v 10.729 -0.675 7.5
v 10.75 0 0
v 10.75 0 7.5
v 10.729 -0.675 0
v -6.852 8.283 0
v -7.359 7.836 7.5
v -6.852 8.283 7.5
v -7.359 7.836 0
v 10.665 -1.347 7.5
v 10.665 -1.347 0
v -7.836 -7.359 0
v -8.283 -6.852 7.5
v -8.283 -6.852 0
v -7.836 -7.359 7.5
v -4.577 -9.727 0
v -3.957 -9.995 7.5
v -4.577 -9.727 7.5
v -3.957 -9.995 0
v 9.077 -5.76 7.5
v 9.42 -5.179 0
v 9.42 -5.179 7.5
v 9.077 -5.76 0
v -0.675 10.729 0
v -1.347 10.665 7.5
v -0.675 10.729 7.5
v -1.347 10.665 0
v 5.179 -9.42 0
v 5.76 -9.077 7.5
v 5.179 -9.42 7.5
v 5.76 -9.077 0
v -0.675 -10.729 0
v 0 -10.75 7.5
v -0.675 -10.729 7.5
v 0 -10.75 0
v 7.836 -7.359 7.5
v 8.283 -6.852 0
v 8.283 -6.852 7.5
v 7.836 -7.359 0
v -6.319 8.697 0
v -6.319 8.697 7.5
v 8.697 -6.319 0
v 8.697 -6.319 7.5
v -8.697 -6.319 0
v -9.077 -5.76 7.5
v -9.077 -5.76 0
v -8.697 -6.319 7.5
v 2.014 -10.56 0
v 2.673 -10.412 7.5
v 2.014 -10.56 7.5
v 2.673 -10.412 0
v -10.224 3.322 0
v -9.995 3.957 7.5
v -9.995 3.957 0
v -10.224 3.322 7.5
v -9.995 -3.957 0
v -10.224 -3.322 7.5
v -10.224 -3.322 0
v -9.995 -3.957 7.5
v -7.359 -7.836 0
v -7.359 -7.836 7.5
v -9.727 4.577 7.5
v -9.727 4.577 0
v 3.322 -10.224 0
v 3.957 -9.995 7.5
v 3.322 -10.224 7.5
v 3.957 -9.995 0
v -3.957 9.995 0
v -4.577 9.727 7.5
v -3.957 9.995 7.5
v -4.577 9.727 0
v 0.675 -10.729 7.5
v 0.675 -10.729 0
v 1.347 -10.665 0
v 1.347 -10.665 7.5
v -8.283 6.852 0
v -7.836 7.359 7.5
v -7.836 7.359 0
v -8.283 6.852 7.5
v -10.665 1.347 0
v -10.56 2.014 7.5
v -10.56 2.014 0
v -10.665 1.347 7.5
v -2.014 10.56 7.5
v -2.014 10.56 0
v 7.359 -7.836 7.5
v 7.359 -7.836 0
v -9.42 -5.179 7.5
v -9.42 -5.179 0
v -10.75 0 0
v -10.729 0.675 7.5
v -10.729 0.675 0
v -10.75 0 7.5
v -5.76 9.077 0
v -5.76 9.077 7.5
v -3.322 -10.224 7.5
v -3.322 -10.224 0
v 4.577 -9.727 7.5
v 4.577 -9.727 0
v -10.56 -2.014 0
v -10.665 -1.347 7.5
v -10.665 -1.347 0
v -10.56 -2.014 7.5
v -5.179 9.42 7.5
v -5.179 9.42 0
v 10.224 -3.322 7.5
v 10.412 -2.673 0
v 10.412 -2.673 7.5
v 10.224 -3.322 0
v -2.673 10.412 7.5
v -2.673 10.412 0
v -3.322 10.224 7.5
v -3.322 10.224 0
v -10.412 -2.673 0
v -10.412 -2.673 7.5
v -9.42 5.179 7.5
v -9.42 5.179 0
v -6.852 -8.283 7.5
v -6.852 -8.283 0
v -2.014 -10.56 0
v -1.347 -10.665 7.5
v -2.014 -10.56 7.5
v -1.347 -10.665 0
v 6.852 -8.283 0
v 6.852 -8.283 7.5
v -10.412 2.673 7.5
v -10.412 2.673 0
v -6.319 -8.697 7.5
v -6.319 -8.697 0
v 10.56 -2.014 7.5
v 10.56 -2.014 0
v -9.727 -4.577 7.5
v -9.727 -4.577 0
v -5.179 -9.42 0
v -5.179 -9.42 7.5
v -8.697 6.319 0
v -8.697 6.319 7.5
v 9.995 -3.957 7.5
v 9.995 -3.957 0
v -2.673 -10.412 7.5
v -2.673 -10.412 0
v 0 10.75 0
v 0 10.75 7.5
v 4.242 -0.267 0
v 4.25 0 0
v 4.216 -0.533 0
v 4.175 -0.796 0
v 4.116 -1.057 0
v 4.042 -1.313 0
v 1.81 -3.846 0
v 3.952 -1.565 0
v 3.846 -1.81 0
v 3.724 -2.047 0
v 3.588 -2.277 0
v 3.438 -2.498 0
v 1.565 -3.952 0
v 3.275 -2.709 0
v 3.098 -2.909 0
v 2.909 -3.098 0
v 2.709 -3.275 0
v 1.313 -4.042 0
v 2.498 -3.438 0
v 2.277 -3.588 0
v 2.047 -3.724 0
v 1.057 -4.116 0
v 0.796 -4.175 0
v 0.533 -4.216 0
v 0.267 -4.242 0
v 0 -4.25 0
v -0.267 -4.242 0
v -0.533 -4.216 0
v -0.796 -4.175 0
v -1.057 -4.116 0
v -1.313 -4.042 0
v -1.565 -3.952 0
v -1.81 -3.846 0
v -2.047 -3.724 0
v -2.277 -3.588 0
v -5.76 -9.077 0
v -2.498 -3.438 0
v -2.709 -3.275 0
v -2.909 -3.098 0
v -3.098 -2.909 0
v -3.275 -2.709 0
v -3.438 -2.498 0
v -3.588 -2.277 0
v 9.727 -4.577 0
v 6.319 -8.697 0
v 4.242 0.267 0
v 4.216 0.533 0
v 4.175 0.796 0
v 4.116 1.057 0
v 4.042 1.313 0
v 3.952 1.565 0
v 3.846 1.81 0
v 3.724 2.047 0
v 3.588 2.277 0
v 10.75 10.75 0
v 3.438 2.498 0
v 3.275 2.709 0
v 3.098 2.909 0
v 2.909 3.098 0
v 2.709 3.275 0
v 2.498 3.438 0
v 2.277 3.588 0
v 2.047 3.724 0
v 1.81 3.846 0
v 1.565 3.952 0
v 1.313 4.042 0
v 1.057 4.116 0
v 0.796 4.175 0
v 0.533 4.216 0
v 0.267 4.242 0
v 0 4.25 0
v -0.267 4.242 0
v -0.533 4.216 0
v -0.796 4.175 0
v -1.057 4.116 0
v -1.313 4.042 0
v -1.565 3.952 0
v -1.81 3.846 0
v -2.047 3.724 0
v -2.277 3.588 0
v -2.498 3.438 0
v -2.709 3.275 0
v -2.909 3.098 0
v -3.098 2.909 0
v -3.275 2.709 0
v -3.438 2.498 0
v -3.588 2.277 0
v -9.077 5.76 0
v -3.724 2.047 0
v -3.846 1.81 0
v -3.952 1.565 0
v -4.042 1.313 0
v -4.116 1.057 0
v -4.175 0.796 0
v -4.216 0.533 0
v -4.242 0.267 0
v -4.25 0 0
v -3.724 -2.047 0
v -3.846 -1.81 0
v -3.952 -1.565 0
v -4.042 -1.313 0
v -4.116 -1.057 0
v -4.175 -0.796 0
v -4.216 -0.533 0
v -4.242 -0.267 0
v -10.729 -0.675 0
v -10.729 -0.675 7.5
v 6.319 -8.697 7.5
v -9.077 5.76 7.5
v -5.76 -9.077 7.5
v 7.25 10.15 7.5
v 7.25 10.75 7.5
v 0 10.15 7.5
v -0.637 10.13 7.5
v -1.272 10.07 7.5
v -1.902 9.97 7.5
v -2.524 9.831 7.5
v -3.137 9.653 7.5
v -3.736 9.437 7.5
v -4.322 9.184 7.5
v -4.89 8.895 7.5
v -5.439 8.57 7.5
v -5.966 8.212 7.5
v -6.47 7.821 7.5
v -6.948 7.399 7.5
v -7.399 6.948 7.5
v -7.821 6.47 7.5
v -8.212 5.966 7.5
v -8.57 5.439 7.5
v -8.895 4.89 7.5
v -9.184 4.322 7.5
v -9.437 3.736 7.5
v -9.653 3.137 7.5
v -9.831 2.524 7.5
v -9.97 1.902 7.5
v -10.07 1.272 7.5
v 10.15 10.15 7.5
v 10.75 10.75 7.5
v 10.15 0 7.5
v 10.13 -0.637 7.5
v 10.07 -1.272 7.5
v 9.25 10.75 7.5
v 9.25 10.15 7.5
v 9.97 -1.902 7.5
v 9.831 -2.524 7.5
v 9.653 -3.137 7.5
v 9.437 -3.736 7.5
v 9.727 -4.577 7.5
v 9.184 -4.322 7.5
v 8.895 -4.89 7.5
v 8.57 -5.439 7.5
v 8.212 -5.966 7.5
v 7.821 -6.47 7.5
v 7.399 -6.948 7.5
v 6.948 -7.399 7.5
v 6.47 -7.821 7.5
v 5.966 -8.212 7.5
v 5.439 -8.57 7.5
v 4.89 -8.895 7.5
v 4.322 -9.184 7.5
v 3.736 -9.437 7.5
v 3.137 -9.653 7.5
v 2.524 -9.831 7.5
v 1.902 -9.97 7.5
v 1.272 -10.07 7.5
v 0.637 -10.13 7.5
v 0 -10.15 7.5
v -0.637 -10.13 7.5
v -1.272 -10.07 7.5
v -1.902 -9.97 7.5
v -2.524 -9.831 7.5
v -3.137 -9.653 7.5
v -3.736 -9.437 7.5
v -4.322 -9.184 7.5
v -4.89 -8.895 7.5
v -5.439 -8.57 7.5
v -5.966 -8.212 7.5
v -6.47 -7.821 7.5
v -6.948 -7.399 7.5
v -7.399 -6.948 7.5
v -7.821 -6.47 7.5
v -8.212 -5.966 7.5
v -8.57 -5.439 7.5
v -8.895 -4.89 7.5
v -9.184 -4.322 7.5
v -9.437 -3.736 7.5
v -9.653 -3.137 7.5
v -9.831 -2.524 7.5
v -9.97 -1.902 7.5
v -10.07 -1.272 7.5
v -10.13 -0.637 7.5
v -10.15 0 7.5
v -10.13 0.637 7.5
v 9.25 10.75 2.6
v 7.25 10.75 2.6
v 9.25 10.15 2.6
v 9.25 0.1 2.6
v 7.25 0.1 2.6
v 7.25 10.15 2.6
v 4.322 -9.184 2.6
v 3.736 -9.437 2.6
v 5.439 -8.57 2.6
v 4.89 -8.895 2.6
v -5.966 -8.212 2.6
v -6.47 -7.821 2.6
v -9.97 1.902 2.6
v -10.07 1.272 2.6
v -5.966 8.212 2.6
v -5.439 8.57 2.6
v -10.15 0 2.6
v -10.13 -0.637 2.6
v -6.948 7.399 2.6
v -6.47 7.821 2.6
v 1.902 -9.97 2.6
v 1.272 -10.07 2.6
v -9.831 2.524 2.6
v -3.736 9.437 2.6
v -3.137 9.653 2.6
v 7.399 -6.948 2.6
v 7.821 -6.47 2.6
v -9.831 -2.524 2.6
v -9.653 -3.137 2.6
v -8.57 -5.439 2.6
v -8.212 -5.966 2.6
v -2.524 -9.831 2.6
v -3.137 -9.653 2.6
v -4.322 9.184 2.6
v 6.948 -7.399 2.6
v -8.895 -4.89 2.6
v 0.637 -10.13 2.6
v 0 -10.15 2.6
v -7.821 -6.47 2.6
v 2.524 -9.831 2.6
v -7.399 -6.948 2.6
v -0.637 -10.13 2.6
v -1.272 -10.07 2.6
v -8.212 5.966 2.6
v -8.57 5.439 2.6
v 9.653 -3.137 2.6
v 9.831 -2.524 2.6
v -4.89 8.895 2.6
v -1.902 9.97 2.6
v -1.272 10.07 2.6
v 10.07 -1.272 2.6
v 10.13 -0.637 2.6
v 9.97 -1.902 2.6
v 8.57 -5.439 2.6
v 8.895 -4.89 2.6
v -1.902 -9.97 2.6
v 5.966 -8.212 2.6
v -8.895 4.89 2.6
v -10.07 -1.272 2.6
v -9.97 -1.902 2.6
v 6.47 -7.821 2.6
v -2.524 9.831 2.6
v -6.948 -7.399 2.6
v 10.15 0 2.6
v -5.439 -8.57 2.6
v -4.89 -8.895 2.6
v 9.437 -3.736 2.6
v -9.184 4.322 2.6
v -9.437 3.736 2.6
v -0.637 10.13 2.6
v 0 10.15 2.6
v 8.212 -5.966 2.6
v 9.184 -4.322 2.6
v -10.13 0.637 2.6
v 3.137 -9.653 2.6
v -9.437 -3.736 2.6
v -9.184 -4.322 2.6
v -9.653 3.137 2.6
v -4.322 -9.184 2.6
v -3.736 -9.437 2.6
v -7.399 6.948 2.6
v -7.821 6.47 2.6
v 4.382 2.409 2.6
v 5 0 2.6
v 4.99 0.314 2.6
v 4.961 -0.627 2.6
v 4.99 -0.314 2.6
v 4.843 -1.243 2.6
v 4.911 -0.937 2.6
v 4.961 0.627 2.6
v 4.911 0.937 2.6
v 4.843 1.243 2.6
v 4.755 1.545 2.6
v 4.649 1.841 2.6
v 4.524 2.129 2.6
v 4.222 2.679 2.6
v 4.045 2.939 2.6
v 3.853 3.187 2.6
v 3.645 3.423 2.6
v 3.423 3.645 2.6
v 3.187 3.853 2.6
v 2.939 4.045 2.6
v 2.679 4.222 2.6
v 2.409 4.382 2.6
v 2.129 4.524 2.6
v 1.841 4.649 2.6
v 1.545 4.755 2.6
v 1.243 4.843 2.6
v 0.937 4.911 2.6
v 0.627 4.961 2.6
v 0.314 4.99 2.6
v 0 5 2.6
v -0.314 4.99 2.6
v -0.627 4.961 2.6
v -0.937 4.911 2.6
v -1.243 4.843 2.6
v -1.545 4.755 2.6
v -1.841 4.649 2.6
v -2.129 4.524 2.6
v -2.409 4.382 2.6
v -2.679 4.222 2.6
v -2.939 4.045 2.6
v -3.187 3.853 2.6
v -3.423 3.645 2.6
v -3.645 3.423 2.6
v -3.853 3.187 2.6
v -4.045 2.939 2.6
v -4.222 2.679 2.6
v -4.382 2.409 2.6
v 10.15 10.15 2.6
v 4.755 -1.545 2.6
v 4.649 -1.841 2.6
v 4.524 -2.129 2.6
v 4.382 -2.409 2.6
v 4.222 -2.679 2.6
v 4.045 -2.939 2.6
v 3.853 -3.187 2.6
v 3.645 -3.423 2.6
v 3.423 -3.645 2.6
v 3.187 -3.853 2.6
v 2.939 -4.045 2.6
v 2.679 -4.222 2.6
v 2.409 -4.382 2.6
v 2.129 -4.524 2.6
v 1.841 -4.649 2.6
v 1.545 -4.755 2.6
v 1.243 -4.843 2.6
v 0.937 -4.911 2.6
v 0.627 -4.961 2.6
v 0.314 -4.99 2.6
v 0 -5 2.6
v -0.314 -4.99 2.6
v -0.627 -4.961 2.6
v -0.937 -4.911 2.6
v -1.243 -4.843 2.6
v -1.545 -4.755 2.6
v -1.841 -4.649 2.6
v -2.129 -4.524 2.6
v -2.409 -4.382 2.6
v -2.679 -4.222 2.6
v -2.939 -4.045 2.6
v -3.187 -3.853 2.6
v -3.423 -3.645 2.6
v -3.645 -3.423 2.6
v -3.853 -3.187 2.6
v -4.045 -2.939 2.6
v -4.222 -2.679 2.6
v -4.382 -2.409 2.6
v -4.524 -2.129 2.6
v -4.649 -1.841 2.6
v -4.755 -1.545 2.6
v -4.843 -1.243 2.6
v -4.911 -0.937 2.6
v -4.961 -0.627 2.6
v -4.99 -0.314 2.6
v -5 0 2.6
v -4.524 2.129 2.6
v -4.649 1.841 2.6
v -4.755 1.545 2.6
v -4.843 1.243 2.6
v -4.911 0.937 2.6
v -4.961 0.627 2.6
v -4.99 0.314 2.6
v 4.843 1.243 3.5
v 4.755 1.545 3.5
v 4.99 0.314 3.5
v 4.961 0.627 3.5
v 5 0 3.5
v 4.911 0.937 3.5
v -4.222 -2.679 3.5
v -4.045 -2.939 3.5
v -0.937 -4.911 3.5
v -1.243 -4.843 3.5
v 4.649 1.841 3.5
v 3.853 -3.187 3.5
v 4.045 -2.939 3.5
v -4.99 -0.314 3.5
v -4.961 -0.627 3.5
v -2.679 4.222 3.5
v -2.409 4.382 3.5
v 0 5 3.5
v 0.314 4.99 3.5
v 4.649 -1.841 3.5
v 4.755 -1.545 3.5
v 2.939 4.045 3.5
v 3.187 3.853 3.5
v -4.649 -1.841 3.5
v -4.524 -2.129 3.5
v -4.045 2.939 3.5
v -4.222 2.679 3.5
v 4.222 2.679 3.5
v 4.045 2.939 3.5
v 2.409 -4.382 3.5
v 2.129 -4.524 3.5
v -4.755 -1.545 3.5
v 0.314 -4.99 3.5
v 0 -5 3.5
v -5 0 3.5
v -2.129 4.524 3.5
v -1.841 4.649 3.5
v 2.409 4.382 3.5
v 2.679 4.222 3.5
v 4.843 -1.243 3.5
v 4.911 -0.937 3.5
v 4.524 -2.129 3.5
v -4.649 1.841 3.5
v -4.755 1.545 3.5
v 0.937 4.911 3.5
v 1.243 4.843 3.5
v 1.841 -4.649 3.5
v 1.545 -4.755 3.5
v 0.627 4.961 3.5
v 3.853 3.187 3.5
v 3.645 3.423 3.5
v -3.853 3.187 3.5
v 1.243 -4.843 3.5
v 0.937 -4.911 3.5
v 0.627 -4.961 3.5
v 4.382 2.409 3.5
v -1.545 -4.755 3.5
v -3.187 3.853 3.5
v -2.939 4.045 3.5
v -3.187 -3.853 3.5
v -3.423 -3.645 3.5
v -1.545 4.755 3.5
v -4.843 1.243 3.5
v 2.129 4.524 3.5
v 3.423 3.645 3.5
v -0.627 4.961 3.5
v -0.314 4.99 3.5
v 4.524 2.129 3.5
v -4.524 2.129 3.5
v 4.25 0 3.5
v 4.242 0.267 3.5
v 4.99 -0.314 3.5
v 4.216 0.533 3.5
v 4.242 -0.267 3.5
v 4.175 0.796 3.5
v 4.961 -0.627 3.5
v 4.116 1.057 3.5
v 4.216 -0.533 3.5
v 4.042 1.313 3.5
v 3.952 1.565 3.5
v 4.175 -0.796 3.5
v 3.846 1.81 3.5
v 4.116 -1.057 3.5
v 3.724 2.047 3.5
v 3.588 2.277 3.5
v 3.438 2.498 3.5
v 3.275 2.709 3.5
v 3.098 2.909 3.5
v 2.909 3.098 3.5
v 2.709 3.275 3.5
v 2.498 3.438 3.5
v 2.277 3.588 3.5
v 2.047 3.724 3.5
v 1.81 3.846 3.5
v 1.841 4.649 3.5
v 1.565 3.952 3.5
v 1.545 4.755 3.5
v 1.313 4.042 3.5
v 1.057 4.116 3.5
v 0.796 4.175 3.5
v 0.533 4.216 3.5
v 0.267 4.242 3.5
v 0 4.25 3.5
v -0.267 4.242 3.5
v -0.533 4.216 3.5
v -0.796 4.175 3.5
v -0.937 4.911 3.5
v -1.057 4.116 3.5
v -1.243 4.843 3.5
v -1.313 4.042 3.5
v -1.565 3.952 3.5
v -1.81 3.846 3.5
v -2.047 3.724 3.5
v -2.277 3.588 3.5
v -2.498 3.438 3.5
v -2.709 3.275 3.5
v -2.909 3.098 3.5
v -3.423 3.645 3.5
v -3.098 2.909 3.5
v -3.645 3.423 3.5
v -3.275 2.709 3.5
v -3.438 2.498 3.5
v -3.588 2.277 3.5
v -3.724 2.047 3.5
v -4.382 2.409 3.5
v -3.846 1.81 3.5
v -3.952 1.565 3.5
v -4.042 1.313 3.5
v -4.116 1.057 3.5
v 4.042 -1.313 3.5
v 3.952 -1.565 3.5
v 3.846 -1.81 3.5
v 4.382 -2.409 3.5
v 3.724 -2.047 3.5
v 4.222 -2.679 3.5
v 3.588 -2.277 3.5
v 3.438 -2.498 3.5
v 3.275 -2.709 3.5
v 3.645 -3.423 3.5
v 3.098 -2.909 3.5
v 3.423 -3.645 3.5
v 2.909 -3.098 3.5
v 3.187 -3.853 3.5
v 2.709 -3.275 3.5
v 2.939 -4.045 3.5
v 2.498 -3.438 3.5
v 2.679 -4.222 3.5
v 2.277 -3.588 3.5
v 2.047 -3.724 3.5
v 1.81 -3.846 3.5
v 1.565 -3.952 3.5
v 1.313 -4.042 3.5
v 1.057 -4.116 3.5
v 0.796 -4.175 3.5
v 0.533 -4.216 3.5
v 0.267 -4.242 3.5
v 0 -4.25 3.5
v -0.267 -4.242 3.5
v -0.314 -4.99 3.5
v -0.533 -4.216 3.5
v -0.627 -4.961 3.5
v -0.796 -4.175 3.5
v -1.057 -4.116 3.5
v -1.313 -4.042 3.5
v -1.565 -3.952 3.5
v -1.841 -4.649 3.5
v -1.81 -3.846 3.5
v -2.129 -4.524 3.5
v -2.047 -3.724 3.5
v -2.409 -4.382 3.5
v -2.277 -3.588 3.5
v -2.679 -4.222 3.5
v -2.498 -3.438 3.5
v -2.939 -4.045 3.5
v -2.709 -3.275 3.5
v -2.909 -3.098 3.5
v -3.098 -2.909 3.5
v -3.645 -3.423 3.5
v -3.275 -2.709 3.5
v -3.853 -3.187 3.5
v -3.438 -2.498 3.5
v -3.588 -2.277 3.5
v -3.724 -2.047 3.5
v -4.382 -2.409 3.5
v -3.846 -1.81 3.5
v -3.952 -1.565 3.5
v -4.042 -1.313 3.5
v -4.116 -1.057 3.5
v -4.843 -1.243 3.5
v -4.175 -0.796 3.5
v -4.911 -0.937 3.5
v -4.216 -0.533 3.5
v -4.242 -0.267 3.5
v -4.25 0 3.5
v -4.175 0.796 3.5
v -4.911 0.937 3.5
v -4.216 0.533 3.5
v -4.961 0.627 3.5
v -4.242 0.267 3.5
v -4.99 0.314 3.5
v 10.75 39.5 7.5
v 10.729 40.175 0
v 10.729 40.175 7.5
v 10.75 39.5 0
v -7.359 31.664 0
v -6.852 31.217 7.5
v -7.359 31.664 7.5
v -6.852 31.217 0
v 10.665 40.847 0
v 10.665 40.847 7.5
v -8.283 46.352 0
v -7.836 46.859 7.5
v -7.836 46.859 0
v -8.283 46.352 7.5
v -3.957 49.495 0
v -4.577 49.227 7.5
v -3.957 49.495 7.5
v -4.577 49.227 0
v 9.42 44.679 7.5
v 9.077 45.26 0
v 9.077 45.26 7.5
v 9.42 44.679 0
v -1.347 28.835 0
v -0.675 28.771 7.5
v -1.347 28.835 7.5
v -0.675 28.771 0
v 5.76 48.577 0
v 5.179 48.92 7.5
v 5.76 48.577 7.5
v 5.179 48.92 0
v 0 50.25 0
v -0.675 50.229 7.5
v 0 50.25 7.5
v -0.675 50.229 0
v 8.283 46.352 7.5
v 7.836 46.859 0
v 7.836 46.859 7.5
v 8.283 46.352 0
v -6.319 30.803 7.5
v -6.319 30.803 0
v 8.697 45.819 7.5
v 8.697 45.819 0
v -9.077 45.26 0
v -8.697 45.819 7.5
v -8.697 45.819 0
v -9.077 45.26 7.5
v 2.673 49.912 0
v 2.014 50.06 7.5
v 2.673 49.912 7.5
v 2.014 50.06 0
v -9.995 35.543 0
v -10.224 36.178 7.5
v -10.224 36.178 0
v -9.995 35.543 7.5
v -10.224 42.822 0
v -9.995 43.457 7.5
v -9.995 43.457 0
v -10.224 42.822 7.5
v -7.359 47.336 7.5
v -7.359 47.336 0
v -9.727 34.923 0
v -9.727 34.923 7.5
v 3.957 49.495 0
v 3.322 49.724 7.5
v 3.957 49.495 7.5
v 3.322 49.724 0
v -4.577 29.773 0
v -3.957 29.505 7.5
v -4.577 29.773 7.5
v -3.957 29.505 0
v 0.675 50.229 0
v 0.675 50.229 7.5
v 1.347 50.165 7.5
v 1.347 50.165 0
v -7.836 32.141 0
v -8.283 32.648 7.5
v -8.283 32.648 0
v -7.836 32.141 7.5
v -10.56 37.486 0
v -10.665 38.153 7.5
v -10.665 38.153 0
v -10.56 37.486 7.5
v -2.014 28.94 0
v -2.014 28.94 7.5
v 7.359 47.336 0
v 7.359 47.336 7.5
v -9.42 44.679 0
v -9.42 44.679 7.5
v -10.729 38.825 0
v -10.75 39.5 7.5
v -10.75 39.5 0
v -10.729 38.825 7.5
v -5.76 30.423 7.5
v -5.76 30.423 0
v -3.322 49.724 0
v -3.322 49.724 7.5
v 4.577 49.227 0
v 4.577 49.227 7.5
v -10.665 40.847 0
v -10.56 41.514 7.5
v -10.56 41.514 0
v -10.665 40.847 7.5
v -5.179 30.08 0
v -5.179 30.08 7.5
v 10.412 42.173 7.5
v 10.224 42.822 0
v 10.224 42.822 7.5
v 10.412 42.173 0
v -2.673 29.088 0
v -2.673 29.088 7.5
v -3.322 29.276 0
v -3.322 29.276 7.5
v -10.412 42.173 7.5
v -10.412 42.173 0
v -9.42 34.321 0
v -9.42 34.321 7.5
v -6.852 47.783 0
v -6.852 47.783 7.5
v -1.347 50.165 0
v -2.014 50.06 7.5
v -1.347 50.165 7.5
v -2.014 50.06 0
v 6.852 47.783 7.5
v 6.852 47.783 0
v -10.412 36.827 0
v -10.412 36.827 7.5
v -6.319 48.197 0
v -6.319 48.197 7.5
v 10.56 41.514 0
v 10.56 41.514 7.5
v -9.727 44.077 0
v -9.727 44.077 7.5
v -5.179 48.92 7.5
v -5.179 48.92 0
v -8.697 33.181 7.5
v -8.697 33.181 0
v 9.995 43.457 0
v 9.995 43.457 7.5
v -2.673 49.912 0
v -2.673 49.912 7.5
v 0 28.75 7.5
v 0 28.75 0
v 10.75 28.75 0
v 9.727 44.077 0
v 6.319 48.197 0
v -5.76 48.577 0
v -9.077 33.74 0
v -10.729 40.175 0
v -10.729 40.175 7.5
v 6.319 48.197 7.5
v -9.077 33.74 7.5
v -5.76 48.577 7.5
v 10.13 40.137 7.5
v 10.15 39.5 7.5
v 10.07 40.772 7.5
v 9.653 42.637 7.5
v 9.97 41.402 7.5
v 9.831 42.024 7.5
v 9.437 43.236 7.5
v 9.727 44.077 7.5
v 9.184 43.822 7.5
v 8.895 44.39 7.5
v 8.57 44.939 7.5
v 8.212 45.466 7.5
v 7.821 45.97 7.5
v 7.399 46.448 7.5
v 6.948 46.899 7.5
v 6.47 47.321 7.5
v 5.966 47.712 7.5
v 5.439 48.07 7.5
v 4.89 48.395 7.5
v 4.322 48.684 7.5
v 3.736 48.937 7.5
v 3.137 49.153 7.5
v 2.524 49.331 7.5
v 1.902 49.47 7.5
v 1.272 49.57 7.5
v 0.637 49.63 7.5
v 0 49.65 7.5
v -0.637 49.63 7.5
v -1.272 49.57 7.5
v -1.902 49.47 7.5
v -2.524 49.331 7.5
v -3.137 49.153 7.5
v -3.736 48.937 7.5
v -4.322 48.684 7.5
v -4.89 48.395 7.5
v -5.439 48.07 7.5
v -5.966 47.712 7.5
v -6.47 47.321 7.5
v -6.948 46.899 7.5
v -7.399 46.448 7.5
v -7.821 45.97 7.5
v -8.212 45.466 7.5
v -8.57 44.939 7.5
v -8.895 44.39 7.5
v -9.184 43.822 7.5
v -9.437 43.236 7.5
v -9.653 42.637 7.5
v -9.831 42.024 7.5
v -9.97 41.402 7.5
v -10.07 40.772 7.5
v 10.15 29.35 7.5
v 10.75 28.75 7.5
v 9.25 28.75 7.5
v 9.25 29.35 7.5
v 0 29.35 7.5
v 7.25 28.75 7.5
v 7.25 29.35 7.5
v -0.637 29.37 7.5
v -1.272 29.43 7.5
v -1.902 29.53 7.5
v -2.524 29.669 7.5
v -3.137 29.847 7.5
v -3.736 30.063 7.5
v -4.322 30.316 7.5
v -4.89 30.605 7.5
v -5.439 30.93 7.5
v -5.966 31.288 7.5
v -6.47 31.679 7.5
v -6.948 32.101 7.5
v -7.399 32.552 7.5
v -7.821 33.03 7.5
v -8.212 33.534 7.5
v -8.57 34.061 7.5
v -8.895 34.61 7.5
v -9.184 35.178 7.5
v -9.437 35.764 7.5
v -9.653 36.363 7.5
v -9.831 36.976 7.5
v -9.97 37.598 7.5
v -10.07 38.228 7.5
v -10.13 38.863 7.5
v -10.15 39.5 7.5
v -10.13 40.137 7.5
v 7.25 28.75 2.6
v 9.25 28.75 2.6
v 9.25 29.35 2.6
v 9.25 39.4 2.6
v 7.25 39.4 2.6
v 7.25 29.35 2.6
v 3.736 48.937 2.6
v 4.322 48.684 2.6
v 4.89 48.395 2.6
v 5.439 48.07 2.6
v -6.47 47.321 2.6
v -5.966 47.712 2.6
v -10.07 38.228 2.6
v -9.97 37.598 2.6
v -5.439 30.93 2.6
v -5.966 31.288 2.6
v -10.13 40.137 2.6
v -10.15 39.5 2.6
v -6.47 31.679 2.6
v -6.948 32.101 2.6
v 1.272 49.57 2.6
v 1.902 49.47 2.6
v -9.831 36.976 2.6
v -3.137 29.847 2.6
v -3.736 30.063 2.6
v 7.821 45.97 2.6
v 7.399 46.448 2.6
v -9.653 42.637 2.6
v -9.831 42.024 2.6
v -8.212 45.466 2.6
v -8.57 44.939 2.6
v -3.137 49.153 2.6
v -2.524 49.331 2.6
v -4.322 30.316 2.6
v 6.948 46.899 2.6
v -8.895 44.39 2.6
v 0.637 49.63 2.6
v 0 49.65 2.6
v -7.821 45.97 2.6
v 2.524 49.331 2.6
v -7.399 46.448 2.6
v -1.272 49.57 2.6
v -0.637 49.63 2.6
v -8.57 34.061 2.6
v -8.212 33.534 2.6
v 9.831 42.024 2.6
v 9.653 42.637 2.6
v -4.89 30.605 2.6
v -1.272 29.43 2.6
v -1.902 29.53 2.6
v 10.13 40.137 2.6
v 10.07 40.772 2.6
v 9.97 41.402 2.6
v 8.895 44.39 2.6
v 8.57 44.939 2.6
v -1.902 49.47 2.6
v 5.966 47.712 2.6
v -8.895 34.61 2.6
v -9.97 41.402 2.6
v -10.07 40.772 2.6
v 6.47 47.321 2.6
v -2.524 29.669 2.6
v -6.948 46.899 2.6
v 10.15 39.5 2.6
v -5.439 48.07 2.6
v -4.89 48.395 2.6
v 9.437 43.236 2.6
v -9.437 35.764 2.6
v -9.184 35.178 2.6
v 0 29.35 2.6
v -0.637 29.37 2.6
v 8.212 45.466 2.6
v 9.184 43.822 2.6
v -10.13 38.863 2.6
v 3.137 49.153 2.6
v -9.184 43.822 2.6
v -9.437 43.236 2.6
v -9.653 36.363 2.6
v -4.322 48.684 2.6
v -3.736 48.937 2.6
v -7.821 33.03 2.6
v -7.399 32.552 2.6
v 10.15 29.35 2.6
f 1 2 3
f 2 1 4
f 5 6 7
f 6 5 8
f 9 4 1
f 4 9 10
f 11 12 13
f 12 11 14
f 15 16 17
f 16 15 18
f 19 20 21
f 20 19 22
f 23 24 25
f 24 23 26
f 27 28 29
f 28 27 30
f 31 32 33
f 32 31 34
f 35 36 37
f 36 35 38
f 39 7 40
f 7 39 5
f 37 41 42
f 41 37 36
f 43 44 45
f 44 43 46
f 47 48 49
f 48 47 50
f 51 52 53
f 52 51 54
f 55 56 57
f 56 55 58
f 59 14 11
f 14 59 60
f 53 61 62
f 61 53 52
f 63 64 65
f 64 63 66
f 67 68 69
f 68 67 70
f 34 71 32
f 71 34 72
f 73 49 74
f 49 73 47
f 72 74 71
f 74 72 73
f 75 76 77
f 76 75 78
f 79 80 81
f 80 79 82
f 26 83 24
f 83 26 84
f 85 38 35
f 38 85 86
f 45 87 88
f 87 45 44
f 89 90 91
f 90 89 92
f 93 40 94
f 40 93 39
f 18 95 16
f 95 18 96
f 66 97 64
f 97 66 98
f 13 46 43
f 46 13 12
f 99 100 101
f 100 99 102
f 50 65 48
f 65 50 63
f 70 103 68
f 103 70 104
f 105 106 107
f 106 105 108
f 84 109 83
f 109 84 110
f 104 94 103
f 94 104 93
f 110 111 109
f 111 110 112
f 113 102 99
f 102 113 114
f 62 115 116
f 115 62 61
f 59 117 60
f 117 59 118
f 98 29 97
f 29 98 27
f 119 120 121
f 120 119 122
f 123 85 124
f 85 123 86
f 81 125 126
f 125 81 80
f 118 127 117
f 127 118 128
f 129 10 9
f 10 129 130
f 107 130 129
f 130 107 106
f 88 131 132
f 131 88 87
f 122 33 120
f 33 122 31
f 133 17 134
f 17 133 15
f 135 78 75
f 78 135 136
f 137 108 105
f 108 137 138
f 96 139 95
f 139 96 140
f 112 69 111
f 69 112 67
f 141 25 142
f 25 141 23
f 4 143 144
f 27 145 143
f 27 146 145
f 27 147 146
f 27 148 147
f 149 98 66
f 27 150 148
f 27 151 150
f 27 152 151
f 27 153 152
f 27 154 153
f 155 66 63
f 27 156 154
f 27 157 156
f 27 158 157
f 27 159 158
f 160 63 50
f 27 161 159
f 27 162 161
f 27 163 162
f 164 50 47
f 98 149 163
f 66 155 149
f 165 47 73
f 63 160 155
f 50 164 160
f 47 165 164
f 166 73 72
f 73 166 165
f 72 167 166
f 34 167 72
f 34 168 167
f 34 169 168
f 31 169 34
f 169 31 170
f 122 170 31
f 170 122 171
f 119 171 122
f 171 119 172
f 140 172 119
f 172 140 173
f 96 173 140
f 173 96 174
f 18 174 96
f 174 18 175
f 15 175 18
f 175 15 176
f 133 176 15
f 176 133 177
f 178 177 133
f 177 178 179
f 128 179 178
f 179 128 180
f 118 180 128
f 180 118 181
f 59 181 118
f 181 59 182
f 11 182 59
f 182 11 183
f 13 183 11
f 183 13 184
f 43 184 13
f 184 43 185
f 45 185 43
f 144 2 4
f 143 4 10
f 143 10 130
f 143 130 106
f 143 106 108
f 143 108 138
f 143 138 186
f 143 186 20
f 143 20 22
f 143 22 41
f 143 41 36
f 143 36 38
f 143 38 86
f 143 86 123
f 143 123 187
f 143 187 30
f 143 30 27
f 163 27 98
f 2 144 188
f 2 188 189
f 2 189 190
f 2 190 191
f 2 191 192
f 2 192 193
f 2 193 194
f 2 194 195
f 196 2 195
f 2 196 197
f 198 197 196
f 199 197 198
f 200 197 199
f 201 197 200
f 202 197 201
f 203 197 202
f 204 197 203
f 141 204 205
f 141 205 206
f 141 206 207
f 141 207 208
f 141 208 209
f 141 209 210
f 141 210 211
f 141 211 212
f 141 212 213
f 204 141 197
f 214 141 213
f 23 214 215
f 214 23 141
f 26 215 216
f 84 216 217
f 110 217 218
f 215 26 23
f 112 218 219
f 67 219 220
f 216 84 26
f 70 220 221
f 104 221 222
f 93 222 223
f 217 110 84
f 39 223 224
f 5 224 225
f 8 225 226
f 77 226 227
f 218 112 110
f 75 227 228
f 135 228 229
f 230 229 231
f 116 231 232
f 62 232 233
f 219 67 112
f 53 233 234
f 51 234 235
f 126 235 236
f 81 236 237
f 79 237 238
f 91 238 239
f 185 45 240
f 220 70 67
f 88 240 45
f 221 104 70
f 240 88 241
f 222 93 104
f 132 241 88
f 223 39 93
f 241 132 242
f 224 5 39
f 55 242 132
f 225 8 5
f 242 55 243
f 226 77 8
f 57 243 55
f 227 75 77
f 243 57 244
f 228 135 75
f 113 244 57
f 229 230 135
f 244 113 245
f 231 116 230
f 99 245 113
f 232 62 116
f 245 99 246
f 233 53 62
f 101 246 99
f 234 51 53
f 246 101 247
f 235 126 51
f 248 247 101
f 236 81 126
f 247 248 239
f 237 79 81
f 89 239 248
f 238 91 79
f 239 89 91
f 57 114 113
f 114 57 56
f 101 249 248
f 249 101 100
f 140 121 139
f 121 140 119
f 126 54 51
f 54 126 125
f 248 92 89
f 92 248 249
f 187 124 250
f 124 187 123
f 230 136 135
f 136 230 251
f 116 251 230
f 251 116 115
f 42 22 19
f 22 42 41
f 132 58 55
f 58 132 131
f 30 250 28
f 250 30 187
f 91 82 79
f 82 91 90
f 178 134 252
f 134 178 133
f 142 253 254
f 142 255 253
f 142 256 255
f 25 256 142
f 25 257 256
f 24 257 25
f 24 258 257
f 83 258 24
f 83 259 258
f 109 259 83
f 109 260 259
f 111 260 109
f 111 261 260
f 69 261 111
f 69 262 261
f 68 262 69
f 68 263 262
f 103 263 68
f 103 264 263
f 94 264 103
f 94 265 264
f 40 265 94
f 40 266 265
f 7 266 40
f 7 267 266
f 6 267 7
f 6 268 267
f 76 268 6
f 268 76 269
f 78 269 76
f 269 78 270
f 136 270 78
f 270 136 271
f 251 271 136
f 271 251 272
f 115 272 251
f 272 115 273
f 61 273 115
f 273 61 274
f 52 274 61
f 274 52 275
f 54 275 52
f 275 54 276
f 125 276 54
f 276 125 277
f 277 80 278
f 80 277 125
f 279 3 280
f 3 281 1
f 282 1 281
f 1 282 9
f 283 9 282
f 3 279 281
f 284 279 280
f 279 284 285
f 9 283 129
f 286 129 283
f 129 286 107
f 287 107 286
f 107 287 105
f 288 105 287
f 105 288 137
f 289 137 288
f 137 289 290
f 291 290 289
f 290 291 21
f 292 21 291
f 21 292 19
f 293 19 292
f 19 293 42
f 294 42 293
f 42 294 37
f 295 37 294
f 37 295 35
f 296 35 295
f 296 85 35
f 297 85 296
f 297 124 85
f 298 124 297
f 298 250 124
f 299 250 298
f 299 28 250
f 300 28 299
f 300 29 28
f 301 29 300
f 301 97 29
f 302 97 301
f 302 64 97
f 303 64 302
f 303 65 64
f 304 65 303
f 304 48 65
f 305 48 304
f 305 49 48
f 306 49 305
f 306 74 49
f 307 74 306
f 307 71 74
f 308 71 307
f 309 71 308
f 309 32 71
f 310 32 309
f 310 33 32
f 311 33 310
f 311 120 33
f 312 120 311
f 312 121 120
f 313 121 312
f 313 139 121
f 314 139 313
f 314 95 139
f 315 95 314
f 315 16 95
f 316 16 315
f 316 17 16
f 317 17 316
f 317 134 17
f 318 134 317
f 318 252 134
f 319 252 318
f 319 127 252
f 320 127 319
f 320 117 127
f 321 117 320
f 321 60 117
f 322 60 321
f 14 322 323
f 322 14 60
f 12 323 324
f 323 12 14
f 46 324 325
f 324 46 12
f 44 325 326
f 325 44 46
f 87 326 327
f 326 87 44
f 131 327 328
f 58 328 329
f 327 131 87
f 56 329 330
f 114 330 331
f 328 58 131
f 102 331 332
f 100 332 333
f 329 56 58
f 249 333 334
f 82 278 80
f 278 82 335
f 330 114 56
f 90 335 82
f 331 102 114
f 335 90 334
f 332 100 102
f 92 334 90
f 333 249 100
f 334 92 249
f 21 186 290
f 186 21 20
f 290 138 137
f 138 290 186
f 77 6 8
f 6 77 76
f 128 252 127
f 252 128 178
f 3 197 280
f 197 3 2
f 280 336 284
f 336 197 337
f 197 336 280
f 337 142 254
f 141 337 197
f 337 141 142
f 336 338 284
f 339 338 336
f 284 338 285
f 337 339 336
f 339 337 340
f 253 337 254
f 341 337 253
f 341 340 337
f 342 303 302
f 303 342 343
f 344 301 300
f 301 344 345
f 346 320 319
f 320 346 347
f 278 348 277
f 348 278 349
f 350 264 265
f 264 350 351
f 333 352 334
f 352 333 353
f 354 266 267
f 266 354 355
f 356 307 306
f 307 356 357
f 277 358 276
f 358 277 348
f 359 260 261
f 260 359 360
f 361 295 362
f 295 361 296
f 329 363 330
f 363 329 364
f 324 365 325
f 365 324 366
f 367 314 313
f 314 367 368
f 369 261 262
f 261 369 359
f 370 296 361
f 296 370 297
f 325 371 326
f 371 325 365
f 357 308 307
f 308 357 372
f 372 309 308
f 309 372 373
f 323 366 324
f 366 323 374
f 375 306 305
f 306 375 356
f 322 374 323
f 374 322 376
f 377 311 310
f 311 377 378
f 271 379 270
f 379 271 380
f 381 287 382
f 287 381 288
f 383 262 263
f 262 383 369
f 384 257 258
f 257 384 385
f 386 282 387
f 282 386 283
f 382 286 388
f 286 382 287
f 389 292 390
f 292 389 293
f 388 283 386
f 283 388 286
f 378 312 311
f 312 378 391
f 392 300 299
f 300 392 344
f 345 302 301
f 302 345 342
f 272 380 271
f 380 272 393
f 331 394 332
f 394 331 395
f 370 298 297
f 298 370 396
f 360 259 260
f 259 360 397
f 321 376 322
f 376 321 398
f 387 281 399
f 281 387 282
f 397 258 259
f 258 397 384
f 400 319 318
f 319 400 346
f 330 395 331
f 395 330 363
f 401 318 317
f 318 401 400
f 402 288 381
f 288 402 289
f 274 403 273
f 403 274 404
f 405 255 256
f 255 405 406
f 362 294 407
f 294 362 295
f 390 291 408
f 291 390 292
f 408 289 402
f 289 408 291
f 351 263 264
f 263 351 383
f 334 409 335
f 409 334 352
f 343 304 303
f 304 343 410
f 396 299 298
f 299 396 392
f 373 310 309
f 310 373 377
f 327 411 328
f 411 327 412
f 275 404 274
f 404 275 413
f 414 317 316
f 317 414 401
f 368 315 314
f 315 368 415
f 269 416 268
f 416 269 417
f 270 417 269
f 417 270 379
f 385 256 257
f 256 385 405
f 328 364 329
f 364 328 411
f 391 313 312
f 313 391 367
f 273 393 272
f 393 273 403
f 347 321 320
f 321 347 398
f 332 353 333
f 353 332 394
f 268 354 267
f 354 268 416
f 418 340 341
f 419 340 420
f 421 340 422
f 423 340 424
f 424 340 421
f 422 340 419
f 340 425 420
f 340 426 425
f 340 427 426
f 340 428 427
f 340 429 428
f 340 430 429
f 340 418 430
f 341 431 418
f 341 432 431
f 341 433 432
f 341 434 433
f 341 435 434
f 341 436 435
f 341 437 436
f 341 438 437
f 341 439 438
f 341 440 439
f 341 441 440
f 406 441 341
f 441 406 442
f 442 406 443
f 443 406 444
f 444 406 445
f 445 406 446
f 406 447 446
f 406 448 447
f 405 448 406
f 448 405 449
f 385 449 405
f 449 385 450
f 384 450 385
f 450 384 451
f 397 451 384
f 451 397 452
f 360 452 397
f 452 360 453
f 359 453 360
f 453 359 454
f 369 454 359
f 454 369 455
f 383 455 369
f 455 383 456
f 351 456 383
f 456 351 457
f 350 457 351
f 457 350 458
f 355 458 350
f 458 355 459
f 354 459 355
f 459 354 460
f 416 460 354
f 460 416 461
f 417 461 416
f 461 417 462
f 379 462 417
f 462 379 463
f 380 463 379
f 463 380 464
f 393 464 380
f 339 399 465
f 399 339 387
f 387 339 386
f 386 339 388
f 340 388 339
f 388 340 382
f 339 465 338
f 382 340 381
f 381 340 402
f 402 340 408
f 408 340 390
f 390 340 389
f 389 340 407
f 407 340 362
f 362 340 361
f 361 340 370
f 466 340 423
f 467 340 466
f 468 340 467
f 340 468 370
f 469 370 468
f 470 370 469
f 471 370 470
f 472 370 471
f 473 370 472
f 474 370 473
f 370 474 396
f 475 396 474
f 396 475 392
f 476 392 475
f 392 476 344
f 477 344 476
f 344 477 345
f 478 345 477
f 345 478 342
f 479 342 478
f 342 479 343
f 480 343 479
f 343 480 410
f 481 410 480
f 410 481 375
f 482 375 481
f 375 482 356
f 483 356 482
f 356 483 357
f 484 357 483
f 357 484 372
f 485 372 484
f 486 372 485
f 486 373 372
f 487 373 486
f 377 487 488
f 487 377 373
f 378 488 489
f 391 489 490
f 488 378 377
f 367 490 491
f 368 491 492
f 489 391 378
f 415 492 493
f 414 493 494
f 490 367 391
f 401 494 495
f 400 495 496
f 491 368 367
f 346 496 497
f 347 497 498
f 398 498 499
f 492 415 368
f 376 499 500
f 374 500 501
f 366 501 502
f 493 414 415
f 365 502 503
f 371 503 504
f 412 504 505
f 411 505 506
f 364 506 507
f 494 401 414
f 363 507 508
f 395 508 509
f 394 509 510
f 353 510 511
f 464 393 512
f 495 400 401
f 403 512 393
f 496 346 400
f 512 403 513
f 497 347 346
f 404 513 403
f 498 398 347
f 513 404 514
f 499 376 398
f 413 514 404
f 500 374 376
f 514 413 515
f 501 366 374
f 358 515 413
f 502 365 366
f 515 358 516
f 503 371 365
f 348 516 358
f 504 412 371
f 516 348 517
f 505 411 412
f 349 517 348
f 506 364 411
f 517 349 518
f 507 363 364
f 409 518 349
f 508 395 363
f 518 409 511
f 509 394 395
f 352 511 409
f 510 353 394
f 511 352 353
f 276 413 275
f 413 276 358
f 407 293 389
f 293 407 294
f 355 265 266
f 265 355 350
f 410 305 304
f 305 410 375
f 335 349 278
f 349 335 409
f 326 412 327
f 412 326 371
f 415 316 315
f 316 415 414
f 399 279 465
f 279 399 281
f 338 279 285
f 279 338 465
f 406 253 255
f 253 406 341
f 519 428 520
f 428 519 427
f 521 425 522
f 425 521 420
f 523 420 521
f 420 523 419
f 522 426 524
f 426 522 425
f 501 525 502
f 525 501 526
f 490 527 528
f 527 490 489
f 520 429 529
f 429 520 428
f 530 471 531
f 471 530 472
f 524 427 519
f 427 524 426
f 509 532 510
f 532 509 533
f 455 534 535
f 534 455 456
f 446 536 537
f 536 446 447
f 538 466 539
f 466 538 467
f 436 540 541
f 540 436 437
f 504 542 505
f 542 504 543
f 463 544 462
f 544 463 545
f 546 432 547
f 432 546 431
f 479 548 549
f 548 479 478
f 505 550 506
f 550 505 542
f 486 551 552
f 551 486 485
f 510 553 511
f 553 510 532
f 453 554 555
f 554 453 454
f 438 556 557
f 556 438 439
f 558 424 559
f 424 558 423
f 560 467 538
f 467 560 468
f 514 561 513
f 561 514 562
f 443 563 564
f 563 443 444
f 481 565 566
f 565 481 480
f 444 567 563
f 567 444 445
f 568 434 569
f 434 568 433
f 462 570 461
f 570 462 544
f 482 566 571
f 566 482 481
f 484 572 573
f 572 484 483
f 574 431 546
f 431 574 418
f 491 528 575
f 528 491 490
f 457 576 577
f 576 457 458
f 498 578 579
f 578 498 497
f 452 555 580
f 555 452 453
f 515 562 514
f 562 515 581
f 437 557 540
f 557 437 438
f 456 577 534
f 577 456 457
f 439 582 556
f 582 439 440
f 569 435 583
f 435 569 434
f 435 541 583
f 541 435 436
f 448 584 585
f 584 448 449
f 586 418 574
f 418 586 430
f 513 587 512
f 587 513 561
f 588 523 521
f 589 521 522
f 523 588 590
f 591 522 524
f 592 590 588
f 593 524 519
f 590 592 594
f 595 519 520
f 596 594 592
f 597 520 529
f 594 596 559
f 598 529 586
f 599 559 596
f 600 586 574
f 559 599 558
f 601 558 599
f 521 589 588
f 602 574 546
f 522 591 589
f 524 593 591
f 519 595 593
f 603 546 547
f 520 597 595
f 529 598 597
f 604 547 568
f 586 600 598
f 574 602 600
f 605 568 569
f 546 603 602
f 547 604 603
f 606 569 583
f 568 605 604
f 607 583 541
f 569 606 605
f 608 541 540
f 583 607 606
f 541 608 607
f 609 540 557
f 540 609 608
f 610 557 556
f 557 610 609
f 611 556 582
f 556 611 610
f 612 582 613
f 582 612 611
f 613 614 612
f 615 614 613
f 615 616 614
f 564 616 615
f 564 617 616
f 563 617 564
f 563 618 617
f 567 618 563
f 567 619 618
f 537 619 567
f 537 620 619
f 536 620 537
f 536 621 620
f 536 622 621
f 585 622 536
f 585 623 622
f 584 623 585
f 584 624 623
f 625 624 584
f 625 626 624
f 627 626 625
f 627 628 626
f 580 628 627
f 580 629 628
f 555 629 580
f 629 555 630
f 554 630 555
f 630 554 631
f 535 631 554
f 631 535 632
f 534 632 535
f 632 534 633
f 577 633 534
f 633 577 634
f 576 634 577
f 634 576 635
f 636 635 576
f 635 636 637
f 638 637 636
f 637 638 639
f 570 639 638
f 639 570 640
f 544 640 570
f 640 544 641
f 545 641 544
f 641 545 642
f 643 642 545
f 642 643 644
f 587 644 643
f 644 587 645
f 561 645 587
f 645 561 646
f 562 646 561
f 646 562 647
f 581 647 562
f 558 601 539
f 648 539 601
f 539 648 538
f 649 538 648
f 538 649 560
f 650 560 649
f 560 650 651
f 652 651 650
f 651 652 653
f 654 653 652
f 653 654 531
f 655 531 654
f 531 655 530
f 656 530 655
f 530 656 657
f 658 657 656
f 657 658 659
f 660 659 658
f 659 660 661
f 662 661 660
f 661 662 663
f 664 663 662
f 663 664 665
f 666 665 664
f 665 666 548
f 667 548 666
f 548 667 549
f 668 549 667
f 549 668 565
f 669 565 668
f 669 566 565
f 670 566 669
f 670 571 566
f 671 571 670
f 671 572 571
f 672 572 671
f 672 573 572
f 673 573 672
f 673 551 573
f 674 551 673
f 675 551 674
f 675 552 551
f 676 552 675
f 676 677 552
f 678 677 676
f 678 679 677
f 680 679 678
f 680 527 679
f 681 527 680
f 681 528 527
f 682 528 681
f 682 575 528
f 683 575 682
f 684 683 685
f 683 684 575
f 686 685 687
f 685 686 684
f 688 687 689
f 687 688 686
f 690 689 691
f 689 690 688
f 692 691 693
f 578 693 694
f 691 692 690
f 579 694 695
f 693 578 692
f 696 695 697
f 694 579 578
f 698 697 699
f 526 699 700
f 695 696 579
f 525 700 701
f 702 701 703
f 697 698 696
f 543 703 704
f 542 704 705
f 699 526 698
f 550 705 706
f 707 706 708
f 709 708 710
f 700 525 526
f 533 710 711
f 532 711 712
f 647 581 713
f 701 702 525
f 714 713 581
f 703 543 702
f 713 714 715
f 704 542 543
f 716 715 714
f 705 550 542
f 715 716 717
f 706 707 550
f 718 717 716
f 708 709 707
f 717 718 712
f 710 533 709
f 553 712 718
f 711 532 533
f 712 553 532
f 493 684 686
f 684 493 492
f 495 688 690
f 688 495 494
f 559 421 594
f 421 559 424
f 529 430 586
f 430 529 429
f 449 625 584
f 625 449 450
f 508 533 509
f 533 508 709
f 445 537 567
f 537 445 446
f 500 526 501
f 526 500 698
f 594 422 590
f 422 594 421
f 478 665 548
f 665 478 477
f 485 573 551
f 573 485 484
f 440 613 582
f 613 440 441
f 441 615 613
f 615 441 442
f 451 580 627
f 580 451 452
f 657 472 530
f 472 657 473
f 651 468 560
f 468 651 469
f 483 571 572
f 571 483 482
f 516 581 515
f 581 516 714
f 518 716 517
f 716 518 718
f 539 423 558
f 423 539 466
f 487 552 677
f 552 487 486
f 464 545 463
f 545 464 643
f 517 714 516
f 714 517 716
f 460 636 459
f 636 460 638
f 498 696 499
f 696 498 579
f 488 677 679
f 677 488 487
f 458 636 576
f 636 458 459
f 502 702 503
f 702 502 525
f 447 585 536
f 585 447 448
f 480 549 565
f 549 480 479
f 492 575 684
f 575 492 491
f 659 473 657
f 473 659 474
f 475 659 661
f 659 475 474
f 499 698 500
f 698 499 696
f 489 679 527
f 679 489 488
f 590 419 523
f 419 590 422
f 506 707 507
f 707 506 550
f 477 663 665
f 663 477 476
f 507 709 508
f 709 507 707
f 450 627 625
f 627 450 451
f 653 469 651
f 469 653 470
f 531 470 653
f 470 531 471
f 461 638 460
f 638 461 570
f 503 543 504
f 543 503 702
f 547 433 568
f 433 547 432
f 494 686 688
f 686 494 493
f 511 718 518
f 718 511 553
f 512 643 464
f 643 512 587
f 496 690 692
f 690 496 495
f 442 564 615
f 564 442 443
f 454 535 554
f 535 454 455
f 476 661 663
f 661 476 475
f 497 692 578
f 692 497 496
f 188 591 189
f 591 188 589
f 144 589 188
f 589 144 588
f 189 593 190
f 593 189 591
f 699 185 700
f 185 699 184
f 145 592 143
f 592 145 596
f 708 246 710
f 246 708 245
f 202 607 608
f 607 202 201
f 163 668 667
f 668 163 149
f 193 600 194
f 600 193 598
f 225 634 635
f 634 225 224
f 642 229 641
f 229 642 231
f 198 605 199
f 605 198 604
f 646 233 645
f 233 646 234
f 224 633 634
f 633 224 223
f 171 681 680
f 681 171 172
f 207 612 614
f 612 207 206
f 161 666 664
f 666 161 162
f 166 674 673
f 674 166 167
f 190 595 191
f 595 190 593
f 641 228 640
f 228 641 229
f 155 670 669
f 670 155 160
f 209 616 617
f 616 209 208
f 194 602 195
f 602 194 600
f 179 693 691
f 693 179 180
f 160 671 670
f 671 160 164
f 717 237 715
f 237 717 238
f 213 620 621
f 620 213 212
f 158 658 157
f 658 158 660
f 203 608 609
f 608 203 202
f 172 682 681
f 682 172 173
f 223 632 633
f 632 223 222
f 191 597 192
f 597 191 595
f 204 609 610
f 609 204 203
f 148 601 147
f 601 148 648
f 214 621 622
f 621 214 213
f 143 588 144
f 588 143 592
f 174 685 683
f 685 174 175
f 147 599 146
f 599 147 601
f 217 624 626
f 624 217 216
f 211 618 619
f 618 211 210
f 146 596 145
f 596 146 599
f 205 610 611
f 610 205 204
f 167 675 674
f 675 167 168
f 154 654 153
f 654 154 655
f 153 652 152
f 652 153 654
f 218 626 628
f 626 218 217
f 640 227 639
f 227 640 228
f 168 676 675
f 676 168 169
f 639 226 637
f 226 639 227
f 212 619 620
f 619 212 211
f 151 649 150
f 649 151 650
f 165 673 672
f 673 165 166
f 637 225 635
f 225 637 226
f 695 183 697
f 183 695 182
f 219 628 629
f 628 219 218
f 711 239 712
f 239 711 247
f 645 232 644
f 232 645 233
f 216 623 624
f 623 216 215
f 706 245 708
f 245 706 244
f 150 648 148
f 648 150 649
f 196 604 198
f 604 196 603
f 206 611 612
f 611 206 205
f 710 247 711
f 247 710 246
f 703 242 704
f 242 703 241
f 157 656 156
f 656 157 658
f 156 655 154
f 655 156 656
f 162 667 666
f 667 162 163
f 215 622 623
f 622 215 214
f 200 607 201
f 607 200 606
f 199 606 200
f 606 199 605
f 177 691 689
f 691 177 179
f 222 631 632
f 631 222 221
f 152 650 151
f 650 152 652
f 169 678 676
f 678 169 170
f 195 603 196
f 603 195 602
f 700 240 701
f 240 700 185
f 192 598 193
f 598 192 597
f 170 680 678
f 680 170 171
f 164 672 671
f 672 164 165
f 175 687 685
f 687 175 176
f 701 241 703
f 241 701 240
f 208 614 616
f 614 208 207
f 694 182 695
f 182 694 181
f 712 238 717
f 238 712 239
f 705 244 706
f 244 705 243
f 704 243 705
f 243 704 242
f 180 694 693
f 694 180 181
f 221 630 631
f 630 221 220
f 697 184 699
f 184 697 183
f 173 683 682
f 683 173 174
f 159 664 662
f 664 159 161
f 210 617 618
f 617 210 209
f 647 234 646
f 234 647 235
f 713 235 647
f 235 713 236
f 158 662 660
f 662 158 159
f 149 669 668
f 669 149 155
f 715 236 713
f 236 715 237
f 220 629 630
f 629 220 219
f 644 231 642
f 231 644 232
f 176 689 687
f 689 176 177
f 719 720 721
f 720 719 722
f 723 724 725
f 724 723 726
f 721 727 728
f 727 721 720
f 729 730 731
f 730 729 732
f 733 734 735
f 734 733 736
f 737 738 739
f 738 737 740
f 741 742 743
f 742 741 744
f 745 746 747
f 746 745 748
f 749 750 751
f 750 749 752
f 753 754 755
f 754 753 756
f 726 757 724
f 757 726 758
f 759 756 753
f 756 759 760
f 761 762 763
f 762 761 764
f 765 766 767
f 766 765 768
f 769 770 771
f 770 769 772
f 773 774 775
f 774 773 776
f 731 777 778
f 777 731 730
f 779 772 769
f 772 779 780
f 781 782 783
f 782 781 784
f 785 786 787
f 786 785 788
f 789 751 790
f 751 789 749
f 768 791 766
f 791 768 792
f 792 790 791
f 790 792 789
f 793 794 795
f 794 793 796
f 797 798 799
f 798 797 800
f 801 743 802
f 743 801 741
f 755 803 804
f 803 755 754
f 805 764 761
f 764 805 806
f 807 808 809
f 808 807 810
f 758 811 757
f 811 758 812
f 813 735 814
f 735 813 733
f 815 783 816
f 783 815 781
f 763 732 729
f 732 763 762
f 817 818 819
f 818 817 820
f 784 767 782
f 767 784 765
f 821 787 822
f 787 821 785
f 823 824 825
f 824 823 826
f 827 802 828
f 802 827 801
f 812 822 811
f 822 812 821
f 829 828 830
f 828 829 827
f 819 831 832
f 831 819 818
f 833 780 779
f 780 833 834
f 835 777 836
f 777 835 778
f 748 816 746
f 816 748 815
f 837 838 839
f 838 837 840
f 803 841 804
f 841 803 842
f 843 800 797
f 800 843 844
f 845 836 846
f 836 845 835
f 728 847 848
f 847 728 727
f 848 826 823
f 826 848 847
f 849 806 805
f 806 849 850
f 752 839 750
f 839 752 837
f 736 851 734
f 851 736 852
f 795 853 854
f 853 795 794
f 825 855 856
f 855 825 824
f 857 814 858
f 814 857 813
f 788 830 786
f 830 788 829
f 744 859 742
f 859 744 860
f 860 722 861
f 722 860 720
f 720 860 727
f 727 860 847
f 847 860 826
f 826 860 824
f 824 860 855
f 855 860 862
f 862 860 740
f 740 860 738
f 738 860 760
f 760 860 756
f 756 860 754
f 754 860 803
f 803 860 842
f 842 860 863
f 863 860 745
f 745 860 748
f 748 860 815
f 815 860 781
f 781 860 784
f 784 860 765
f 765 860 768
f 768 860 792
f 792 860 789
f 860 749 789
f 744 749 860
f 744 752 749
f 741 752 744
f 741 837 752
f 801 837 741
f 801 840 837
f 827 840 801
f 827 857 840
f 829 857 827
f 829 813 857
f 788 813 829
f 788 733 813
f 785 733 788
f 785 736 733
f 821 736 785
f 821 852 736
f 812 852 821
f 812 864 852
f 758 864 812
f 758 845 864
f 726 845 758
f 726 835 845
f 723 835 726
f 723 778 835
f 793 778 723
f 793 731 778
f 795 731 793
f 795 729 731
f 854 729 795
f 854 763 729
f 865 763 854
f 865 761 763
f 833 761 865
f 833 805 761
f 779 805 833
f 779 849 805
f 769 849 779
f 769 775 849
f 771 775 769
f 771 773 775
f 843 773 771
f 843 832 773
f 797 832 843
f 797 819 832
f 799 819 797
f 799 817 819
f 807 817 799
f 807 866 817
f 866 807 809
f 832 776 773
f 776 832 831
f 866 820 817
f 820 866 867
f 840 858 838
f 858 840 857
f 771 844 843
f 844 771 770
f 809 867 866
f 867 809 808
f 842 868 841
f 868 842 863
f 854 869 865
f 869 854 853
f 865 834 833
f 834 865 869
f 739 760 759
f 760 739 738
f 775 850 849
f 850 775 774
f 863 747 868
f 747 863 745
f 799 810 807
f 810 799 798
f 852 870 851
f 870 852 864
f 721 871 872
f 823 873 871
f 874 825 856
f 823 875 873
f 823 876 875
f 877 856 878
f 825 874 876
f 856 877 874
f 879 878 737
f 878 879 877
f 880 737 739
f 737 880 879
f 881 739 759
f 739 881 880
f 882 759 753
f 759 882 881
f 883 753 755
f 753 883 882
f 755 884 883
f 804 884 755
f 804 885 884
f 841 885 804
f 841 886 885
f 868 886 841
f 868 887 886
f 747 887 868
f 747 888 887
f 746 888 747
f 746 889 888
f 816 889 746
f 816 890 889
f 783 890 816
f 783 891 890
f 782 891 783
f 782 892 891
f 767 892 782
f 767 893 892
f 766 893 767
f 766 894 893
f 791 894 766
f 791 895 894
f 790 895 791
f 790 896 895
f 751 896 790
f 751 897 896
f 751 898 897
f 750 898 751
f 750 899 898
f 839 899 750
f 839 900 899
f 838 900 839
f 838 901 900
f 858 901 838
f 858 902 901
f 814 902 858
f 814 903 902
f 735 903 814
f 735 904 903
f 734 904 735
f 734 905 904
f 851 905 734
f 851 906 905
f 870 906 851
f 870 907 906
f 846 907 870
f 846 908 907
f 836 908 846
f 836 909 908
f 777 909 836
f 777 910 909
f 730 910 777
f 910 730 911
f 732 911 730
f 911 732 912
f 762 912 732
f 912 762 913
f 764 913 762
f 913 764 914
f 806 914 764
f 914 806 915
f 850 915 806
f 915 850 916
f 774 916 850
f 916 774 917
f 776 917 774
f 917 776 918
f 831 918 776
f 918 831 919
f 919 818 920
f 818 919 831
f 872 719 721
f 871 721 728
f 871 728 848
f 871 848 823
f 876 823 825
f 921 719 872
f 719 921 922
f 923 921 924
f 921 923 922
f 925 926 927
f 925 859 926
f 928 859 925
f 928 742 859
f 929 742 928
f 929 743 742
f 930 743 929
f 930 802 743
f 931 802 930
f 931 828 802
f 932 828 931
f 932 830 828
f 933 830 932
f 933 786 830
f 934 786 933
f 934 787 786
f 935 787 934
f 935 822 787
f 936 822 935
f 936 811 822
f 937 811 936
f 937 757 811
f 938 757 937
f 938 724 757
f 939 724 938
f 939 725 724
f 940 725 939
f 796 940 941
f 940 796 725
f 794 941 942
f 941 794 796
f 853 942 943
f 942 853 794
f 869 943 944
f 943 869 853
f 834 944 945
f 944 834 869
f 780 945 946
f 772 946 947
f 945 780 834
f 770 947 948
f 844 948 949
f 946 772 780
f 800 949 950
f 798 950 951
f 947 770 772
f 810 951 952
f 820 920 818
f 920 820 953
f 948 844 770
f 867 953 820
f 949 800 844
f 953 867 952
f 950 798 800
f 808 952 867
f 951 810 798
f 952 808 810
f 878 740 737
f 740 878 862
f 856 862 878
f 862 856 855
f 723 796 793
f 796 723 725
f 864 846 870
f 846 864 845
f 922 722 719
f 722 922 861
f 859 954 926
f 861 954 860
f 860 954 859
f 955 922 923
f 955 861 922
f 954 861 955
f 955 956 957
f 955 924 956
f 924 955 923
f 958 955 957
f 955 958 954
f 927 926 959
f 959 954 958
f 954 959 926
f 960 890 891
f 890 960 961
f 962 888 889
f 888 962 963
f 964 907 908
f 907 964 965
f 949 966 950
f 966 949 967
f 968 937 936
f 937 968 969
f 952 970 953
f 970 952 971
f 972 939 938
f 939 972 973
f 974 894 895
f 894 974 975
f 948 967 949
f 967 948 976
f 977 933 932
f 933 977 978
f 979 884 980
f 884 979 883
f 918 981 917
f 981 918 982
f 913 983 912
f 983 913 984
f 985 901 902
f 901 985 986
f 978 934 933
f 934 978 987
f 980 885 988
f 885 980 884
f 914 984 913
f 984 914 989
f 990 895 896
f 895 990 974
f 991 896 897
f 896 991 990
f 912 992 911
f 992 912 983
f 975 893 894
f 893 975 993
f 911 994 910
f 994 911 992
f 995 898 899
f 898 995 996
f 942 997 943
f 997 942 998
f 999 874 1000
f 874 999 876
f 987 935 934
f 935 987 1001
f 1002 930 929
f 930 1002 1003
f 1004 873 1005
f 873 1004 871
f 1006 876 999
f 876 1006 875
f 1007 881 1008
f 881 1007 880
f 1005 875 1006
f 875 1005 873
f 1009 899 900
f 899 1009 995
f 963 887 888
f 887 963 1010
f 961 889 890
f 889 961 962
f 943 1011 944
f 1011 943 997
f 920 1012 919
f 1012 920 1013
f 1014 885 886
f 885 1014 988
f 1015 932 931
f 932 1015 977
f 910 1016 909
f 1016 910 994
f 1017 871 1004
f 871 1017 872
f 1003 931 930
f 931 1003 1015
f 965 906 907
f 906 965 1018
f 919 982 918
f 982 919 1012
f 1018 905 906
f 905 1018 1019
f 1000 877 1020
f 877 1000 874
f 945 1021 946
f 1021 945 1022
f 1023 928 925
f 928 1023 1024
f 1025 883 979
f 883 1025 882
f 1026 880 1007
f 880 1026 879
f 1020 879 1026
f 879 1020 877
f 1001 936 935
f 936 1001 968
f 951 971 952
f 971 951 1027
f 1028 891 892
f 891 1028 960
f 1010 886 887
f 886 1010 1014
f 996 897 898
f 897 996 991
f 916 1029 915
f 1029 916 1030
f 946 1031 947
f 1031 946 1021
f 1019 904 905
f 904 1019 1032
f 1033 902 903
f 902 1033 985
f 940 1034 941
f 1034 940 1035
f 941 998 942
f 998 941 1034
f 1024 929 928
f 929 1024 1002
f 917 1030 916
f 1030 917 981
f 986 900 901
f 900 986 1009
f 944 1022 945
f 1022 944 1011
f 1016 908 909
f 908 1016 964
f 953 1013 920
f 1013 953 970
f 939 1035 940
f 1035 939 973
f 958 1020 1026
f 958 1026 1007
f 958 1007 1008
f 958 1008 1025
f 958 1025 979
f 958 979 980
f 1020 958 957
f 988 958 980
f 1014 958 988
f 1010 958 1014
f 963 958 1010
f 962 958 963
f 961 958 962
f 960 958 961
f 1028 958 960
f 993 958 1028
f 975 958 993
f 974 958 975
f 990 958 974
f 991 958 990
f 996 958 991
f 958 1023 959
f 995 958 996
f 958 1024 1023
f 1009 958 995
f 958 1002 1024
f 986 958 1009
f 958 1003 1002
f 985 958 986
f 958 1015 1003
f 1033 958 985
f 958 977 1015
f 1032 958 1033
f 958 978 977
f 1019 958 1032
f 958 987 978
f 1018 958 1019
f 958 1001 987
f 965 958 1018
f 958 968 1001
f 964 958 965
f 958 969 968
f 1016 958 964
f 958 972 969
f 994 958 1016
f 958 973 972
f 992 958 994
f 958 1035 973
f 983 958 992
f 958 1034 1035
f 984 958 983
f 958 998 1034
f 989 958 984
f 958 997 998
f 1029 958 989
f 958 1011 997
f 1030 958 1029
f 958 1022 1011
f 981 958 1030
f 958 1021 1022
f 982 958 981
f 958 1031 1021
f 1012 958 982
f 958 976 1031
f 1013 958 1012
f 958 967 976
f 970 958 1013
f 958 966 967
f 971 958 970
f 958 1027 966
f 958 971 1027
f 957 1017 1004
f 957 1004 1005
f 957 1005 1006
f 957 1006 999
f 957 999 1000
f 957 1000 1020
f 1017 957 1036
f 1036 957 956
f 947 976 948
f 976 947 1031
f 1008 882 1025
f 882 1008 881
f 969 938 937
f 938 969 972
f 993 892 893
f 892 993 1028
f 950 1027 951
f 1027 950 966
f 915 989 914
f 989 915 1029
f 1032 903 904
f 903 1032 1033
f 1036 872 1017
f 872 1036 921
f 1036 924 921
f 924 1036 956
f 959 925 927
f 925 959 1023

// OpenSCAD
$fn=100;

// cartridge lid height
H=7.5;

// cartridge diameter
D=21.5;

// wall thickness
WALL = 1.5;

// ridge thinning thickness
RIDGEWALL = 0.5;
// height of the ridge at the top of the cartridge
RIDGEH = 5;

// film slot width
SLOT = 2;

// gap between the spools
SPOOLGAP = 18;

///////////////////////////////////////////////////////////////////////////////////////////////////

// fudge
FUDGE = 0.1;


// inner part of the spool
module spoolinner()
{
	difference() {
		union() {
			cylinder(H, d=D);		// cylindrical body
			cube([D/2, D/2, H]);	// square section
		}
		union() {
			//translate([0,0,h]) cylinder(H, d=D-(WALL*2));	// inside of cylinder
			//%translate([(D/2)-WALL-SLOT-(D/5)+FUDGE,FUDGE+(D/7),(H-RIDGEWALL)]) cube([D/5, D/5, H]);	// take the sharp edge off the film exit slot
			translate([(D/2)-WALL-SLOT,FUDGE,H-RIDGEH+FUDGE]) cube([SLOT, D/2, H]);	// film exit slot
		}
	}
}

// subtracted from spoolinner() to form the inside of the lid
module lidcavity()
{
	DX = D - ((WALL-RIDGEWALL)*1.2);
	
	difference() {
		union() {
			cylinder(RIDGEH, d=DX);		// cylindrical body
			cube([DX/2, DX/2, RIDGEH]);	// square section
		}
	}
}


module spool() 
{
	difference() {
		spoolinner();
		translate([0,0,H-RIDGEH+FUDGE]) lidcavity();
	}
}


// left lid

RHOLE_RIDGE_DIA = 10;		// locating ridge for the film reel
RHOLE_RIDGE_HGT = 3.5;		// locating ridge height
RHOLE_DIA = 8.5;			// hole dia for takeup spool screw

difference() {
	union() {
		spool();
		cylinder(RHOLE_RIDGE_HGT, d=RHOLE_RIDGE_DIA);
	}
	translate([0,0,-FUDGE]) cylinder(H+(2*FUDGE), d=RHOLE_DIA);		// cylindrical body
}


// right lid
translate([0,SPOOLGAP+D,0]) mirror([0,1,0]) spool();
